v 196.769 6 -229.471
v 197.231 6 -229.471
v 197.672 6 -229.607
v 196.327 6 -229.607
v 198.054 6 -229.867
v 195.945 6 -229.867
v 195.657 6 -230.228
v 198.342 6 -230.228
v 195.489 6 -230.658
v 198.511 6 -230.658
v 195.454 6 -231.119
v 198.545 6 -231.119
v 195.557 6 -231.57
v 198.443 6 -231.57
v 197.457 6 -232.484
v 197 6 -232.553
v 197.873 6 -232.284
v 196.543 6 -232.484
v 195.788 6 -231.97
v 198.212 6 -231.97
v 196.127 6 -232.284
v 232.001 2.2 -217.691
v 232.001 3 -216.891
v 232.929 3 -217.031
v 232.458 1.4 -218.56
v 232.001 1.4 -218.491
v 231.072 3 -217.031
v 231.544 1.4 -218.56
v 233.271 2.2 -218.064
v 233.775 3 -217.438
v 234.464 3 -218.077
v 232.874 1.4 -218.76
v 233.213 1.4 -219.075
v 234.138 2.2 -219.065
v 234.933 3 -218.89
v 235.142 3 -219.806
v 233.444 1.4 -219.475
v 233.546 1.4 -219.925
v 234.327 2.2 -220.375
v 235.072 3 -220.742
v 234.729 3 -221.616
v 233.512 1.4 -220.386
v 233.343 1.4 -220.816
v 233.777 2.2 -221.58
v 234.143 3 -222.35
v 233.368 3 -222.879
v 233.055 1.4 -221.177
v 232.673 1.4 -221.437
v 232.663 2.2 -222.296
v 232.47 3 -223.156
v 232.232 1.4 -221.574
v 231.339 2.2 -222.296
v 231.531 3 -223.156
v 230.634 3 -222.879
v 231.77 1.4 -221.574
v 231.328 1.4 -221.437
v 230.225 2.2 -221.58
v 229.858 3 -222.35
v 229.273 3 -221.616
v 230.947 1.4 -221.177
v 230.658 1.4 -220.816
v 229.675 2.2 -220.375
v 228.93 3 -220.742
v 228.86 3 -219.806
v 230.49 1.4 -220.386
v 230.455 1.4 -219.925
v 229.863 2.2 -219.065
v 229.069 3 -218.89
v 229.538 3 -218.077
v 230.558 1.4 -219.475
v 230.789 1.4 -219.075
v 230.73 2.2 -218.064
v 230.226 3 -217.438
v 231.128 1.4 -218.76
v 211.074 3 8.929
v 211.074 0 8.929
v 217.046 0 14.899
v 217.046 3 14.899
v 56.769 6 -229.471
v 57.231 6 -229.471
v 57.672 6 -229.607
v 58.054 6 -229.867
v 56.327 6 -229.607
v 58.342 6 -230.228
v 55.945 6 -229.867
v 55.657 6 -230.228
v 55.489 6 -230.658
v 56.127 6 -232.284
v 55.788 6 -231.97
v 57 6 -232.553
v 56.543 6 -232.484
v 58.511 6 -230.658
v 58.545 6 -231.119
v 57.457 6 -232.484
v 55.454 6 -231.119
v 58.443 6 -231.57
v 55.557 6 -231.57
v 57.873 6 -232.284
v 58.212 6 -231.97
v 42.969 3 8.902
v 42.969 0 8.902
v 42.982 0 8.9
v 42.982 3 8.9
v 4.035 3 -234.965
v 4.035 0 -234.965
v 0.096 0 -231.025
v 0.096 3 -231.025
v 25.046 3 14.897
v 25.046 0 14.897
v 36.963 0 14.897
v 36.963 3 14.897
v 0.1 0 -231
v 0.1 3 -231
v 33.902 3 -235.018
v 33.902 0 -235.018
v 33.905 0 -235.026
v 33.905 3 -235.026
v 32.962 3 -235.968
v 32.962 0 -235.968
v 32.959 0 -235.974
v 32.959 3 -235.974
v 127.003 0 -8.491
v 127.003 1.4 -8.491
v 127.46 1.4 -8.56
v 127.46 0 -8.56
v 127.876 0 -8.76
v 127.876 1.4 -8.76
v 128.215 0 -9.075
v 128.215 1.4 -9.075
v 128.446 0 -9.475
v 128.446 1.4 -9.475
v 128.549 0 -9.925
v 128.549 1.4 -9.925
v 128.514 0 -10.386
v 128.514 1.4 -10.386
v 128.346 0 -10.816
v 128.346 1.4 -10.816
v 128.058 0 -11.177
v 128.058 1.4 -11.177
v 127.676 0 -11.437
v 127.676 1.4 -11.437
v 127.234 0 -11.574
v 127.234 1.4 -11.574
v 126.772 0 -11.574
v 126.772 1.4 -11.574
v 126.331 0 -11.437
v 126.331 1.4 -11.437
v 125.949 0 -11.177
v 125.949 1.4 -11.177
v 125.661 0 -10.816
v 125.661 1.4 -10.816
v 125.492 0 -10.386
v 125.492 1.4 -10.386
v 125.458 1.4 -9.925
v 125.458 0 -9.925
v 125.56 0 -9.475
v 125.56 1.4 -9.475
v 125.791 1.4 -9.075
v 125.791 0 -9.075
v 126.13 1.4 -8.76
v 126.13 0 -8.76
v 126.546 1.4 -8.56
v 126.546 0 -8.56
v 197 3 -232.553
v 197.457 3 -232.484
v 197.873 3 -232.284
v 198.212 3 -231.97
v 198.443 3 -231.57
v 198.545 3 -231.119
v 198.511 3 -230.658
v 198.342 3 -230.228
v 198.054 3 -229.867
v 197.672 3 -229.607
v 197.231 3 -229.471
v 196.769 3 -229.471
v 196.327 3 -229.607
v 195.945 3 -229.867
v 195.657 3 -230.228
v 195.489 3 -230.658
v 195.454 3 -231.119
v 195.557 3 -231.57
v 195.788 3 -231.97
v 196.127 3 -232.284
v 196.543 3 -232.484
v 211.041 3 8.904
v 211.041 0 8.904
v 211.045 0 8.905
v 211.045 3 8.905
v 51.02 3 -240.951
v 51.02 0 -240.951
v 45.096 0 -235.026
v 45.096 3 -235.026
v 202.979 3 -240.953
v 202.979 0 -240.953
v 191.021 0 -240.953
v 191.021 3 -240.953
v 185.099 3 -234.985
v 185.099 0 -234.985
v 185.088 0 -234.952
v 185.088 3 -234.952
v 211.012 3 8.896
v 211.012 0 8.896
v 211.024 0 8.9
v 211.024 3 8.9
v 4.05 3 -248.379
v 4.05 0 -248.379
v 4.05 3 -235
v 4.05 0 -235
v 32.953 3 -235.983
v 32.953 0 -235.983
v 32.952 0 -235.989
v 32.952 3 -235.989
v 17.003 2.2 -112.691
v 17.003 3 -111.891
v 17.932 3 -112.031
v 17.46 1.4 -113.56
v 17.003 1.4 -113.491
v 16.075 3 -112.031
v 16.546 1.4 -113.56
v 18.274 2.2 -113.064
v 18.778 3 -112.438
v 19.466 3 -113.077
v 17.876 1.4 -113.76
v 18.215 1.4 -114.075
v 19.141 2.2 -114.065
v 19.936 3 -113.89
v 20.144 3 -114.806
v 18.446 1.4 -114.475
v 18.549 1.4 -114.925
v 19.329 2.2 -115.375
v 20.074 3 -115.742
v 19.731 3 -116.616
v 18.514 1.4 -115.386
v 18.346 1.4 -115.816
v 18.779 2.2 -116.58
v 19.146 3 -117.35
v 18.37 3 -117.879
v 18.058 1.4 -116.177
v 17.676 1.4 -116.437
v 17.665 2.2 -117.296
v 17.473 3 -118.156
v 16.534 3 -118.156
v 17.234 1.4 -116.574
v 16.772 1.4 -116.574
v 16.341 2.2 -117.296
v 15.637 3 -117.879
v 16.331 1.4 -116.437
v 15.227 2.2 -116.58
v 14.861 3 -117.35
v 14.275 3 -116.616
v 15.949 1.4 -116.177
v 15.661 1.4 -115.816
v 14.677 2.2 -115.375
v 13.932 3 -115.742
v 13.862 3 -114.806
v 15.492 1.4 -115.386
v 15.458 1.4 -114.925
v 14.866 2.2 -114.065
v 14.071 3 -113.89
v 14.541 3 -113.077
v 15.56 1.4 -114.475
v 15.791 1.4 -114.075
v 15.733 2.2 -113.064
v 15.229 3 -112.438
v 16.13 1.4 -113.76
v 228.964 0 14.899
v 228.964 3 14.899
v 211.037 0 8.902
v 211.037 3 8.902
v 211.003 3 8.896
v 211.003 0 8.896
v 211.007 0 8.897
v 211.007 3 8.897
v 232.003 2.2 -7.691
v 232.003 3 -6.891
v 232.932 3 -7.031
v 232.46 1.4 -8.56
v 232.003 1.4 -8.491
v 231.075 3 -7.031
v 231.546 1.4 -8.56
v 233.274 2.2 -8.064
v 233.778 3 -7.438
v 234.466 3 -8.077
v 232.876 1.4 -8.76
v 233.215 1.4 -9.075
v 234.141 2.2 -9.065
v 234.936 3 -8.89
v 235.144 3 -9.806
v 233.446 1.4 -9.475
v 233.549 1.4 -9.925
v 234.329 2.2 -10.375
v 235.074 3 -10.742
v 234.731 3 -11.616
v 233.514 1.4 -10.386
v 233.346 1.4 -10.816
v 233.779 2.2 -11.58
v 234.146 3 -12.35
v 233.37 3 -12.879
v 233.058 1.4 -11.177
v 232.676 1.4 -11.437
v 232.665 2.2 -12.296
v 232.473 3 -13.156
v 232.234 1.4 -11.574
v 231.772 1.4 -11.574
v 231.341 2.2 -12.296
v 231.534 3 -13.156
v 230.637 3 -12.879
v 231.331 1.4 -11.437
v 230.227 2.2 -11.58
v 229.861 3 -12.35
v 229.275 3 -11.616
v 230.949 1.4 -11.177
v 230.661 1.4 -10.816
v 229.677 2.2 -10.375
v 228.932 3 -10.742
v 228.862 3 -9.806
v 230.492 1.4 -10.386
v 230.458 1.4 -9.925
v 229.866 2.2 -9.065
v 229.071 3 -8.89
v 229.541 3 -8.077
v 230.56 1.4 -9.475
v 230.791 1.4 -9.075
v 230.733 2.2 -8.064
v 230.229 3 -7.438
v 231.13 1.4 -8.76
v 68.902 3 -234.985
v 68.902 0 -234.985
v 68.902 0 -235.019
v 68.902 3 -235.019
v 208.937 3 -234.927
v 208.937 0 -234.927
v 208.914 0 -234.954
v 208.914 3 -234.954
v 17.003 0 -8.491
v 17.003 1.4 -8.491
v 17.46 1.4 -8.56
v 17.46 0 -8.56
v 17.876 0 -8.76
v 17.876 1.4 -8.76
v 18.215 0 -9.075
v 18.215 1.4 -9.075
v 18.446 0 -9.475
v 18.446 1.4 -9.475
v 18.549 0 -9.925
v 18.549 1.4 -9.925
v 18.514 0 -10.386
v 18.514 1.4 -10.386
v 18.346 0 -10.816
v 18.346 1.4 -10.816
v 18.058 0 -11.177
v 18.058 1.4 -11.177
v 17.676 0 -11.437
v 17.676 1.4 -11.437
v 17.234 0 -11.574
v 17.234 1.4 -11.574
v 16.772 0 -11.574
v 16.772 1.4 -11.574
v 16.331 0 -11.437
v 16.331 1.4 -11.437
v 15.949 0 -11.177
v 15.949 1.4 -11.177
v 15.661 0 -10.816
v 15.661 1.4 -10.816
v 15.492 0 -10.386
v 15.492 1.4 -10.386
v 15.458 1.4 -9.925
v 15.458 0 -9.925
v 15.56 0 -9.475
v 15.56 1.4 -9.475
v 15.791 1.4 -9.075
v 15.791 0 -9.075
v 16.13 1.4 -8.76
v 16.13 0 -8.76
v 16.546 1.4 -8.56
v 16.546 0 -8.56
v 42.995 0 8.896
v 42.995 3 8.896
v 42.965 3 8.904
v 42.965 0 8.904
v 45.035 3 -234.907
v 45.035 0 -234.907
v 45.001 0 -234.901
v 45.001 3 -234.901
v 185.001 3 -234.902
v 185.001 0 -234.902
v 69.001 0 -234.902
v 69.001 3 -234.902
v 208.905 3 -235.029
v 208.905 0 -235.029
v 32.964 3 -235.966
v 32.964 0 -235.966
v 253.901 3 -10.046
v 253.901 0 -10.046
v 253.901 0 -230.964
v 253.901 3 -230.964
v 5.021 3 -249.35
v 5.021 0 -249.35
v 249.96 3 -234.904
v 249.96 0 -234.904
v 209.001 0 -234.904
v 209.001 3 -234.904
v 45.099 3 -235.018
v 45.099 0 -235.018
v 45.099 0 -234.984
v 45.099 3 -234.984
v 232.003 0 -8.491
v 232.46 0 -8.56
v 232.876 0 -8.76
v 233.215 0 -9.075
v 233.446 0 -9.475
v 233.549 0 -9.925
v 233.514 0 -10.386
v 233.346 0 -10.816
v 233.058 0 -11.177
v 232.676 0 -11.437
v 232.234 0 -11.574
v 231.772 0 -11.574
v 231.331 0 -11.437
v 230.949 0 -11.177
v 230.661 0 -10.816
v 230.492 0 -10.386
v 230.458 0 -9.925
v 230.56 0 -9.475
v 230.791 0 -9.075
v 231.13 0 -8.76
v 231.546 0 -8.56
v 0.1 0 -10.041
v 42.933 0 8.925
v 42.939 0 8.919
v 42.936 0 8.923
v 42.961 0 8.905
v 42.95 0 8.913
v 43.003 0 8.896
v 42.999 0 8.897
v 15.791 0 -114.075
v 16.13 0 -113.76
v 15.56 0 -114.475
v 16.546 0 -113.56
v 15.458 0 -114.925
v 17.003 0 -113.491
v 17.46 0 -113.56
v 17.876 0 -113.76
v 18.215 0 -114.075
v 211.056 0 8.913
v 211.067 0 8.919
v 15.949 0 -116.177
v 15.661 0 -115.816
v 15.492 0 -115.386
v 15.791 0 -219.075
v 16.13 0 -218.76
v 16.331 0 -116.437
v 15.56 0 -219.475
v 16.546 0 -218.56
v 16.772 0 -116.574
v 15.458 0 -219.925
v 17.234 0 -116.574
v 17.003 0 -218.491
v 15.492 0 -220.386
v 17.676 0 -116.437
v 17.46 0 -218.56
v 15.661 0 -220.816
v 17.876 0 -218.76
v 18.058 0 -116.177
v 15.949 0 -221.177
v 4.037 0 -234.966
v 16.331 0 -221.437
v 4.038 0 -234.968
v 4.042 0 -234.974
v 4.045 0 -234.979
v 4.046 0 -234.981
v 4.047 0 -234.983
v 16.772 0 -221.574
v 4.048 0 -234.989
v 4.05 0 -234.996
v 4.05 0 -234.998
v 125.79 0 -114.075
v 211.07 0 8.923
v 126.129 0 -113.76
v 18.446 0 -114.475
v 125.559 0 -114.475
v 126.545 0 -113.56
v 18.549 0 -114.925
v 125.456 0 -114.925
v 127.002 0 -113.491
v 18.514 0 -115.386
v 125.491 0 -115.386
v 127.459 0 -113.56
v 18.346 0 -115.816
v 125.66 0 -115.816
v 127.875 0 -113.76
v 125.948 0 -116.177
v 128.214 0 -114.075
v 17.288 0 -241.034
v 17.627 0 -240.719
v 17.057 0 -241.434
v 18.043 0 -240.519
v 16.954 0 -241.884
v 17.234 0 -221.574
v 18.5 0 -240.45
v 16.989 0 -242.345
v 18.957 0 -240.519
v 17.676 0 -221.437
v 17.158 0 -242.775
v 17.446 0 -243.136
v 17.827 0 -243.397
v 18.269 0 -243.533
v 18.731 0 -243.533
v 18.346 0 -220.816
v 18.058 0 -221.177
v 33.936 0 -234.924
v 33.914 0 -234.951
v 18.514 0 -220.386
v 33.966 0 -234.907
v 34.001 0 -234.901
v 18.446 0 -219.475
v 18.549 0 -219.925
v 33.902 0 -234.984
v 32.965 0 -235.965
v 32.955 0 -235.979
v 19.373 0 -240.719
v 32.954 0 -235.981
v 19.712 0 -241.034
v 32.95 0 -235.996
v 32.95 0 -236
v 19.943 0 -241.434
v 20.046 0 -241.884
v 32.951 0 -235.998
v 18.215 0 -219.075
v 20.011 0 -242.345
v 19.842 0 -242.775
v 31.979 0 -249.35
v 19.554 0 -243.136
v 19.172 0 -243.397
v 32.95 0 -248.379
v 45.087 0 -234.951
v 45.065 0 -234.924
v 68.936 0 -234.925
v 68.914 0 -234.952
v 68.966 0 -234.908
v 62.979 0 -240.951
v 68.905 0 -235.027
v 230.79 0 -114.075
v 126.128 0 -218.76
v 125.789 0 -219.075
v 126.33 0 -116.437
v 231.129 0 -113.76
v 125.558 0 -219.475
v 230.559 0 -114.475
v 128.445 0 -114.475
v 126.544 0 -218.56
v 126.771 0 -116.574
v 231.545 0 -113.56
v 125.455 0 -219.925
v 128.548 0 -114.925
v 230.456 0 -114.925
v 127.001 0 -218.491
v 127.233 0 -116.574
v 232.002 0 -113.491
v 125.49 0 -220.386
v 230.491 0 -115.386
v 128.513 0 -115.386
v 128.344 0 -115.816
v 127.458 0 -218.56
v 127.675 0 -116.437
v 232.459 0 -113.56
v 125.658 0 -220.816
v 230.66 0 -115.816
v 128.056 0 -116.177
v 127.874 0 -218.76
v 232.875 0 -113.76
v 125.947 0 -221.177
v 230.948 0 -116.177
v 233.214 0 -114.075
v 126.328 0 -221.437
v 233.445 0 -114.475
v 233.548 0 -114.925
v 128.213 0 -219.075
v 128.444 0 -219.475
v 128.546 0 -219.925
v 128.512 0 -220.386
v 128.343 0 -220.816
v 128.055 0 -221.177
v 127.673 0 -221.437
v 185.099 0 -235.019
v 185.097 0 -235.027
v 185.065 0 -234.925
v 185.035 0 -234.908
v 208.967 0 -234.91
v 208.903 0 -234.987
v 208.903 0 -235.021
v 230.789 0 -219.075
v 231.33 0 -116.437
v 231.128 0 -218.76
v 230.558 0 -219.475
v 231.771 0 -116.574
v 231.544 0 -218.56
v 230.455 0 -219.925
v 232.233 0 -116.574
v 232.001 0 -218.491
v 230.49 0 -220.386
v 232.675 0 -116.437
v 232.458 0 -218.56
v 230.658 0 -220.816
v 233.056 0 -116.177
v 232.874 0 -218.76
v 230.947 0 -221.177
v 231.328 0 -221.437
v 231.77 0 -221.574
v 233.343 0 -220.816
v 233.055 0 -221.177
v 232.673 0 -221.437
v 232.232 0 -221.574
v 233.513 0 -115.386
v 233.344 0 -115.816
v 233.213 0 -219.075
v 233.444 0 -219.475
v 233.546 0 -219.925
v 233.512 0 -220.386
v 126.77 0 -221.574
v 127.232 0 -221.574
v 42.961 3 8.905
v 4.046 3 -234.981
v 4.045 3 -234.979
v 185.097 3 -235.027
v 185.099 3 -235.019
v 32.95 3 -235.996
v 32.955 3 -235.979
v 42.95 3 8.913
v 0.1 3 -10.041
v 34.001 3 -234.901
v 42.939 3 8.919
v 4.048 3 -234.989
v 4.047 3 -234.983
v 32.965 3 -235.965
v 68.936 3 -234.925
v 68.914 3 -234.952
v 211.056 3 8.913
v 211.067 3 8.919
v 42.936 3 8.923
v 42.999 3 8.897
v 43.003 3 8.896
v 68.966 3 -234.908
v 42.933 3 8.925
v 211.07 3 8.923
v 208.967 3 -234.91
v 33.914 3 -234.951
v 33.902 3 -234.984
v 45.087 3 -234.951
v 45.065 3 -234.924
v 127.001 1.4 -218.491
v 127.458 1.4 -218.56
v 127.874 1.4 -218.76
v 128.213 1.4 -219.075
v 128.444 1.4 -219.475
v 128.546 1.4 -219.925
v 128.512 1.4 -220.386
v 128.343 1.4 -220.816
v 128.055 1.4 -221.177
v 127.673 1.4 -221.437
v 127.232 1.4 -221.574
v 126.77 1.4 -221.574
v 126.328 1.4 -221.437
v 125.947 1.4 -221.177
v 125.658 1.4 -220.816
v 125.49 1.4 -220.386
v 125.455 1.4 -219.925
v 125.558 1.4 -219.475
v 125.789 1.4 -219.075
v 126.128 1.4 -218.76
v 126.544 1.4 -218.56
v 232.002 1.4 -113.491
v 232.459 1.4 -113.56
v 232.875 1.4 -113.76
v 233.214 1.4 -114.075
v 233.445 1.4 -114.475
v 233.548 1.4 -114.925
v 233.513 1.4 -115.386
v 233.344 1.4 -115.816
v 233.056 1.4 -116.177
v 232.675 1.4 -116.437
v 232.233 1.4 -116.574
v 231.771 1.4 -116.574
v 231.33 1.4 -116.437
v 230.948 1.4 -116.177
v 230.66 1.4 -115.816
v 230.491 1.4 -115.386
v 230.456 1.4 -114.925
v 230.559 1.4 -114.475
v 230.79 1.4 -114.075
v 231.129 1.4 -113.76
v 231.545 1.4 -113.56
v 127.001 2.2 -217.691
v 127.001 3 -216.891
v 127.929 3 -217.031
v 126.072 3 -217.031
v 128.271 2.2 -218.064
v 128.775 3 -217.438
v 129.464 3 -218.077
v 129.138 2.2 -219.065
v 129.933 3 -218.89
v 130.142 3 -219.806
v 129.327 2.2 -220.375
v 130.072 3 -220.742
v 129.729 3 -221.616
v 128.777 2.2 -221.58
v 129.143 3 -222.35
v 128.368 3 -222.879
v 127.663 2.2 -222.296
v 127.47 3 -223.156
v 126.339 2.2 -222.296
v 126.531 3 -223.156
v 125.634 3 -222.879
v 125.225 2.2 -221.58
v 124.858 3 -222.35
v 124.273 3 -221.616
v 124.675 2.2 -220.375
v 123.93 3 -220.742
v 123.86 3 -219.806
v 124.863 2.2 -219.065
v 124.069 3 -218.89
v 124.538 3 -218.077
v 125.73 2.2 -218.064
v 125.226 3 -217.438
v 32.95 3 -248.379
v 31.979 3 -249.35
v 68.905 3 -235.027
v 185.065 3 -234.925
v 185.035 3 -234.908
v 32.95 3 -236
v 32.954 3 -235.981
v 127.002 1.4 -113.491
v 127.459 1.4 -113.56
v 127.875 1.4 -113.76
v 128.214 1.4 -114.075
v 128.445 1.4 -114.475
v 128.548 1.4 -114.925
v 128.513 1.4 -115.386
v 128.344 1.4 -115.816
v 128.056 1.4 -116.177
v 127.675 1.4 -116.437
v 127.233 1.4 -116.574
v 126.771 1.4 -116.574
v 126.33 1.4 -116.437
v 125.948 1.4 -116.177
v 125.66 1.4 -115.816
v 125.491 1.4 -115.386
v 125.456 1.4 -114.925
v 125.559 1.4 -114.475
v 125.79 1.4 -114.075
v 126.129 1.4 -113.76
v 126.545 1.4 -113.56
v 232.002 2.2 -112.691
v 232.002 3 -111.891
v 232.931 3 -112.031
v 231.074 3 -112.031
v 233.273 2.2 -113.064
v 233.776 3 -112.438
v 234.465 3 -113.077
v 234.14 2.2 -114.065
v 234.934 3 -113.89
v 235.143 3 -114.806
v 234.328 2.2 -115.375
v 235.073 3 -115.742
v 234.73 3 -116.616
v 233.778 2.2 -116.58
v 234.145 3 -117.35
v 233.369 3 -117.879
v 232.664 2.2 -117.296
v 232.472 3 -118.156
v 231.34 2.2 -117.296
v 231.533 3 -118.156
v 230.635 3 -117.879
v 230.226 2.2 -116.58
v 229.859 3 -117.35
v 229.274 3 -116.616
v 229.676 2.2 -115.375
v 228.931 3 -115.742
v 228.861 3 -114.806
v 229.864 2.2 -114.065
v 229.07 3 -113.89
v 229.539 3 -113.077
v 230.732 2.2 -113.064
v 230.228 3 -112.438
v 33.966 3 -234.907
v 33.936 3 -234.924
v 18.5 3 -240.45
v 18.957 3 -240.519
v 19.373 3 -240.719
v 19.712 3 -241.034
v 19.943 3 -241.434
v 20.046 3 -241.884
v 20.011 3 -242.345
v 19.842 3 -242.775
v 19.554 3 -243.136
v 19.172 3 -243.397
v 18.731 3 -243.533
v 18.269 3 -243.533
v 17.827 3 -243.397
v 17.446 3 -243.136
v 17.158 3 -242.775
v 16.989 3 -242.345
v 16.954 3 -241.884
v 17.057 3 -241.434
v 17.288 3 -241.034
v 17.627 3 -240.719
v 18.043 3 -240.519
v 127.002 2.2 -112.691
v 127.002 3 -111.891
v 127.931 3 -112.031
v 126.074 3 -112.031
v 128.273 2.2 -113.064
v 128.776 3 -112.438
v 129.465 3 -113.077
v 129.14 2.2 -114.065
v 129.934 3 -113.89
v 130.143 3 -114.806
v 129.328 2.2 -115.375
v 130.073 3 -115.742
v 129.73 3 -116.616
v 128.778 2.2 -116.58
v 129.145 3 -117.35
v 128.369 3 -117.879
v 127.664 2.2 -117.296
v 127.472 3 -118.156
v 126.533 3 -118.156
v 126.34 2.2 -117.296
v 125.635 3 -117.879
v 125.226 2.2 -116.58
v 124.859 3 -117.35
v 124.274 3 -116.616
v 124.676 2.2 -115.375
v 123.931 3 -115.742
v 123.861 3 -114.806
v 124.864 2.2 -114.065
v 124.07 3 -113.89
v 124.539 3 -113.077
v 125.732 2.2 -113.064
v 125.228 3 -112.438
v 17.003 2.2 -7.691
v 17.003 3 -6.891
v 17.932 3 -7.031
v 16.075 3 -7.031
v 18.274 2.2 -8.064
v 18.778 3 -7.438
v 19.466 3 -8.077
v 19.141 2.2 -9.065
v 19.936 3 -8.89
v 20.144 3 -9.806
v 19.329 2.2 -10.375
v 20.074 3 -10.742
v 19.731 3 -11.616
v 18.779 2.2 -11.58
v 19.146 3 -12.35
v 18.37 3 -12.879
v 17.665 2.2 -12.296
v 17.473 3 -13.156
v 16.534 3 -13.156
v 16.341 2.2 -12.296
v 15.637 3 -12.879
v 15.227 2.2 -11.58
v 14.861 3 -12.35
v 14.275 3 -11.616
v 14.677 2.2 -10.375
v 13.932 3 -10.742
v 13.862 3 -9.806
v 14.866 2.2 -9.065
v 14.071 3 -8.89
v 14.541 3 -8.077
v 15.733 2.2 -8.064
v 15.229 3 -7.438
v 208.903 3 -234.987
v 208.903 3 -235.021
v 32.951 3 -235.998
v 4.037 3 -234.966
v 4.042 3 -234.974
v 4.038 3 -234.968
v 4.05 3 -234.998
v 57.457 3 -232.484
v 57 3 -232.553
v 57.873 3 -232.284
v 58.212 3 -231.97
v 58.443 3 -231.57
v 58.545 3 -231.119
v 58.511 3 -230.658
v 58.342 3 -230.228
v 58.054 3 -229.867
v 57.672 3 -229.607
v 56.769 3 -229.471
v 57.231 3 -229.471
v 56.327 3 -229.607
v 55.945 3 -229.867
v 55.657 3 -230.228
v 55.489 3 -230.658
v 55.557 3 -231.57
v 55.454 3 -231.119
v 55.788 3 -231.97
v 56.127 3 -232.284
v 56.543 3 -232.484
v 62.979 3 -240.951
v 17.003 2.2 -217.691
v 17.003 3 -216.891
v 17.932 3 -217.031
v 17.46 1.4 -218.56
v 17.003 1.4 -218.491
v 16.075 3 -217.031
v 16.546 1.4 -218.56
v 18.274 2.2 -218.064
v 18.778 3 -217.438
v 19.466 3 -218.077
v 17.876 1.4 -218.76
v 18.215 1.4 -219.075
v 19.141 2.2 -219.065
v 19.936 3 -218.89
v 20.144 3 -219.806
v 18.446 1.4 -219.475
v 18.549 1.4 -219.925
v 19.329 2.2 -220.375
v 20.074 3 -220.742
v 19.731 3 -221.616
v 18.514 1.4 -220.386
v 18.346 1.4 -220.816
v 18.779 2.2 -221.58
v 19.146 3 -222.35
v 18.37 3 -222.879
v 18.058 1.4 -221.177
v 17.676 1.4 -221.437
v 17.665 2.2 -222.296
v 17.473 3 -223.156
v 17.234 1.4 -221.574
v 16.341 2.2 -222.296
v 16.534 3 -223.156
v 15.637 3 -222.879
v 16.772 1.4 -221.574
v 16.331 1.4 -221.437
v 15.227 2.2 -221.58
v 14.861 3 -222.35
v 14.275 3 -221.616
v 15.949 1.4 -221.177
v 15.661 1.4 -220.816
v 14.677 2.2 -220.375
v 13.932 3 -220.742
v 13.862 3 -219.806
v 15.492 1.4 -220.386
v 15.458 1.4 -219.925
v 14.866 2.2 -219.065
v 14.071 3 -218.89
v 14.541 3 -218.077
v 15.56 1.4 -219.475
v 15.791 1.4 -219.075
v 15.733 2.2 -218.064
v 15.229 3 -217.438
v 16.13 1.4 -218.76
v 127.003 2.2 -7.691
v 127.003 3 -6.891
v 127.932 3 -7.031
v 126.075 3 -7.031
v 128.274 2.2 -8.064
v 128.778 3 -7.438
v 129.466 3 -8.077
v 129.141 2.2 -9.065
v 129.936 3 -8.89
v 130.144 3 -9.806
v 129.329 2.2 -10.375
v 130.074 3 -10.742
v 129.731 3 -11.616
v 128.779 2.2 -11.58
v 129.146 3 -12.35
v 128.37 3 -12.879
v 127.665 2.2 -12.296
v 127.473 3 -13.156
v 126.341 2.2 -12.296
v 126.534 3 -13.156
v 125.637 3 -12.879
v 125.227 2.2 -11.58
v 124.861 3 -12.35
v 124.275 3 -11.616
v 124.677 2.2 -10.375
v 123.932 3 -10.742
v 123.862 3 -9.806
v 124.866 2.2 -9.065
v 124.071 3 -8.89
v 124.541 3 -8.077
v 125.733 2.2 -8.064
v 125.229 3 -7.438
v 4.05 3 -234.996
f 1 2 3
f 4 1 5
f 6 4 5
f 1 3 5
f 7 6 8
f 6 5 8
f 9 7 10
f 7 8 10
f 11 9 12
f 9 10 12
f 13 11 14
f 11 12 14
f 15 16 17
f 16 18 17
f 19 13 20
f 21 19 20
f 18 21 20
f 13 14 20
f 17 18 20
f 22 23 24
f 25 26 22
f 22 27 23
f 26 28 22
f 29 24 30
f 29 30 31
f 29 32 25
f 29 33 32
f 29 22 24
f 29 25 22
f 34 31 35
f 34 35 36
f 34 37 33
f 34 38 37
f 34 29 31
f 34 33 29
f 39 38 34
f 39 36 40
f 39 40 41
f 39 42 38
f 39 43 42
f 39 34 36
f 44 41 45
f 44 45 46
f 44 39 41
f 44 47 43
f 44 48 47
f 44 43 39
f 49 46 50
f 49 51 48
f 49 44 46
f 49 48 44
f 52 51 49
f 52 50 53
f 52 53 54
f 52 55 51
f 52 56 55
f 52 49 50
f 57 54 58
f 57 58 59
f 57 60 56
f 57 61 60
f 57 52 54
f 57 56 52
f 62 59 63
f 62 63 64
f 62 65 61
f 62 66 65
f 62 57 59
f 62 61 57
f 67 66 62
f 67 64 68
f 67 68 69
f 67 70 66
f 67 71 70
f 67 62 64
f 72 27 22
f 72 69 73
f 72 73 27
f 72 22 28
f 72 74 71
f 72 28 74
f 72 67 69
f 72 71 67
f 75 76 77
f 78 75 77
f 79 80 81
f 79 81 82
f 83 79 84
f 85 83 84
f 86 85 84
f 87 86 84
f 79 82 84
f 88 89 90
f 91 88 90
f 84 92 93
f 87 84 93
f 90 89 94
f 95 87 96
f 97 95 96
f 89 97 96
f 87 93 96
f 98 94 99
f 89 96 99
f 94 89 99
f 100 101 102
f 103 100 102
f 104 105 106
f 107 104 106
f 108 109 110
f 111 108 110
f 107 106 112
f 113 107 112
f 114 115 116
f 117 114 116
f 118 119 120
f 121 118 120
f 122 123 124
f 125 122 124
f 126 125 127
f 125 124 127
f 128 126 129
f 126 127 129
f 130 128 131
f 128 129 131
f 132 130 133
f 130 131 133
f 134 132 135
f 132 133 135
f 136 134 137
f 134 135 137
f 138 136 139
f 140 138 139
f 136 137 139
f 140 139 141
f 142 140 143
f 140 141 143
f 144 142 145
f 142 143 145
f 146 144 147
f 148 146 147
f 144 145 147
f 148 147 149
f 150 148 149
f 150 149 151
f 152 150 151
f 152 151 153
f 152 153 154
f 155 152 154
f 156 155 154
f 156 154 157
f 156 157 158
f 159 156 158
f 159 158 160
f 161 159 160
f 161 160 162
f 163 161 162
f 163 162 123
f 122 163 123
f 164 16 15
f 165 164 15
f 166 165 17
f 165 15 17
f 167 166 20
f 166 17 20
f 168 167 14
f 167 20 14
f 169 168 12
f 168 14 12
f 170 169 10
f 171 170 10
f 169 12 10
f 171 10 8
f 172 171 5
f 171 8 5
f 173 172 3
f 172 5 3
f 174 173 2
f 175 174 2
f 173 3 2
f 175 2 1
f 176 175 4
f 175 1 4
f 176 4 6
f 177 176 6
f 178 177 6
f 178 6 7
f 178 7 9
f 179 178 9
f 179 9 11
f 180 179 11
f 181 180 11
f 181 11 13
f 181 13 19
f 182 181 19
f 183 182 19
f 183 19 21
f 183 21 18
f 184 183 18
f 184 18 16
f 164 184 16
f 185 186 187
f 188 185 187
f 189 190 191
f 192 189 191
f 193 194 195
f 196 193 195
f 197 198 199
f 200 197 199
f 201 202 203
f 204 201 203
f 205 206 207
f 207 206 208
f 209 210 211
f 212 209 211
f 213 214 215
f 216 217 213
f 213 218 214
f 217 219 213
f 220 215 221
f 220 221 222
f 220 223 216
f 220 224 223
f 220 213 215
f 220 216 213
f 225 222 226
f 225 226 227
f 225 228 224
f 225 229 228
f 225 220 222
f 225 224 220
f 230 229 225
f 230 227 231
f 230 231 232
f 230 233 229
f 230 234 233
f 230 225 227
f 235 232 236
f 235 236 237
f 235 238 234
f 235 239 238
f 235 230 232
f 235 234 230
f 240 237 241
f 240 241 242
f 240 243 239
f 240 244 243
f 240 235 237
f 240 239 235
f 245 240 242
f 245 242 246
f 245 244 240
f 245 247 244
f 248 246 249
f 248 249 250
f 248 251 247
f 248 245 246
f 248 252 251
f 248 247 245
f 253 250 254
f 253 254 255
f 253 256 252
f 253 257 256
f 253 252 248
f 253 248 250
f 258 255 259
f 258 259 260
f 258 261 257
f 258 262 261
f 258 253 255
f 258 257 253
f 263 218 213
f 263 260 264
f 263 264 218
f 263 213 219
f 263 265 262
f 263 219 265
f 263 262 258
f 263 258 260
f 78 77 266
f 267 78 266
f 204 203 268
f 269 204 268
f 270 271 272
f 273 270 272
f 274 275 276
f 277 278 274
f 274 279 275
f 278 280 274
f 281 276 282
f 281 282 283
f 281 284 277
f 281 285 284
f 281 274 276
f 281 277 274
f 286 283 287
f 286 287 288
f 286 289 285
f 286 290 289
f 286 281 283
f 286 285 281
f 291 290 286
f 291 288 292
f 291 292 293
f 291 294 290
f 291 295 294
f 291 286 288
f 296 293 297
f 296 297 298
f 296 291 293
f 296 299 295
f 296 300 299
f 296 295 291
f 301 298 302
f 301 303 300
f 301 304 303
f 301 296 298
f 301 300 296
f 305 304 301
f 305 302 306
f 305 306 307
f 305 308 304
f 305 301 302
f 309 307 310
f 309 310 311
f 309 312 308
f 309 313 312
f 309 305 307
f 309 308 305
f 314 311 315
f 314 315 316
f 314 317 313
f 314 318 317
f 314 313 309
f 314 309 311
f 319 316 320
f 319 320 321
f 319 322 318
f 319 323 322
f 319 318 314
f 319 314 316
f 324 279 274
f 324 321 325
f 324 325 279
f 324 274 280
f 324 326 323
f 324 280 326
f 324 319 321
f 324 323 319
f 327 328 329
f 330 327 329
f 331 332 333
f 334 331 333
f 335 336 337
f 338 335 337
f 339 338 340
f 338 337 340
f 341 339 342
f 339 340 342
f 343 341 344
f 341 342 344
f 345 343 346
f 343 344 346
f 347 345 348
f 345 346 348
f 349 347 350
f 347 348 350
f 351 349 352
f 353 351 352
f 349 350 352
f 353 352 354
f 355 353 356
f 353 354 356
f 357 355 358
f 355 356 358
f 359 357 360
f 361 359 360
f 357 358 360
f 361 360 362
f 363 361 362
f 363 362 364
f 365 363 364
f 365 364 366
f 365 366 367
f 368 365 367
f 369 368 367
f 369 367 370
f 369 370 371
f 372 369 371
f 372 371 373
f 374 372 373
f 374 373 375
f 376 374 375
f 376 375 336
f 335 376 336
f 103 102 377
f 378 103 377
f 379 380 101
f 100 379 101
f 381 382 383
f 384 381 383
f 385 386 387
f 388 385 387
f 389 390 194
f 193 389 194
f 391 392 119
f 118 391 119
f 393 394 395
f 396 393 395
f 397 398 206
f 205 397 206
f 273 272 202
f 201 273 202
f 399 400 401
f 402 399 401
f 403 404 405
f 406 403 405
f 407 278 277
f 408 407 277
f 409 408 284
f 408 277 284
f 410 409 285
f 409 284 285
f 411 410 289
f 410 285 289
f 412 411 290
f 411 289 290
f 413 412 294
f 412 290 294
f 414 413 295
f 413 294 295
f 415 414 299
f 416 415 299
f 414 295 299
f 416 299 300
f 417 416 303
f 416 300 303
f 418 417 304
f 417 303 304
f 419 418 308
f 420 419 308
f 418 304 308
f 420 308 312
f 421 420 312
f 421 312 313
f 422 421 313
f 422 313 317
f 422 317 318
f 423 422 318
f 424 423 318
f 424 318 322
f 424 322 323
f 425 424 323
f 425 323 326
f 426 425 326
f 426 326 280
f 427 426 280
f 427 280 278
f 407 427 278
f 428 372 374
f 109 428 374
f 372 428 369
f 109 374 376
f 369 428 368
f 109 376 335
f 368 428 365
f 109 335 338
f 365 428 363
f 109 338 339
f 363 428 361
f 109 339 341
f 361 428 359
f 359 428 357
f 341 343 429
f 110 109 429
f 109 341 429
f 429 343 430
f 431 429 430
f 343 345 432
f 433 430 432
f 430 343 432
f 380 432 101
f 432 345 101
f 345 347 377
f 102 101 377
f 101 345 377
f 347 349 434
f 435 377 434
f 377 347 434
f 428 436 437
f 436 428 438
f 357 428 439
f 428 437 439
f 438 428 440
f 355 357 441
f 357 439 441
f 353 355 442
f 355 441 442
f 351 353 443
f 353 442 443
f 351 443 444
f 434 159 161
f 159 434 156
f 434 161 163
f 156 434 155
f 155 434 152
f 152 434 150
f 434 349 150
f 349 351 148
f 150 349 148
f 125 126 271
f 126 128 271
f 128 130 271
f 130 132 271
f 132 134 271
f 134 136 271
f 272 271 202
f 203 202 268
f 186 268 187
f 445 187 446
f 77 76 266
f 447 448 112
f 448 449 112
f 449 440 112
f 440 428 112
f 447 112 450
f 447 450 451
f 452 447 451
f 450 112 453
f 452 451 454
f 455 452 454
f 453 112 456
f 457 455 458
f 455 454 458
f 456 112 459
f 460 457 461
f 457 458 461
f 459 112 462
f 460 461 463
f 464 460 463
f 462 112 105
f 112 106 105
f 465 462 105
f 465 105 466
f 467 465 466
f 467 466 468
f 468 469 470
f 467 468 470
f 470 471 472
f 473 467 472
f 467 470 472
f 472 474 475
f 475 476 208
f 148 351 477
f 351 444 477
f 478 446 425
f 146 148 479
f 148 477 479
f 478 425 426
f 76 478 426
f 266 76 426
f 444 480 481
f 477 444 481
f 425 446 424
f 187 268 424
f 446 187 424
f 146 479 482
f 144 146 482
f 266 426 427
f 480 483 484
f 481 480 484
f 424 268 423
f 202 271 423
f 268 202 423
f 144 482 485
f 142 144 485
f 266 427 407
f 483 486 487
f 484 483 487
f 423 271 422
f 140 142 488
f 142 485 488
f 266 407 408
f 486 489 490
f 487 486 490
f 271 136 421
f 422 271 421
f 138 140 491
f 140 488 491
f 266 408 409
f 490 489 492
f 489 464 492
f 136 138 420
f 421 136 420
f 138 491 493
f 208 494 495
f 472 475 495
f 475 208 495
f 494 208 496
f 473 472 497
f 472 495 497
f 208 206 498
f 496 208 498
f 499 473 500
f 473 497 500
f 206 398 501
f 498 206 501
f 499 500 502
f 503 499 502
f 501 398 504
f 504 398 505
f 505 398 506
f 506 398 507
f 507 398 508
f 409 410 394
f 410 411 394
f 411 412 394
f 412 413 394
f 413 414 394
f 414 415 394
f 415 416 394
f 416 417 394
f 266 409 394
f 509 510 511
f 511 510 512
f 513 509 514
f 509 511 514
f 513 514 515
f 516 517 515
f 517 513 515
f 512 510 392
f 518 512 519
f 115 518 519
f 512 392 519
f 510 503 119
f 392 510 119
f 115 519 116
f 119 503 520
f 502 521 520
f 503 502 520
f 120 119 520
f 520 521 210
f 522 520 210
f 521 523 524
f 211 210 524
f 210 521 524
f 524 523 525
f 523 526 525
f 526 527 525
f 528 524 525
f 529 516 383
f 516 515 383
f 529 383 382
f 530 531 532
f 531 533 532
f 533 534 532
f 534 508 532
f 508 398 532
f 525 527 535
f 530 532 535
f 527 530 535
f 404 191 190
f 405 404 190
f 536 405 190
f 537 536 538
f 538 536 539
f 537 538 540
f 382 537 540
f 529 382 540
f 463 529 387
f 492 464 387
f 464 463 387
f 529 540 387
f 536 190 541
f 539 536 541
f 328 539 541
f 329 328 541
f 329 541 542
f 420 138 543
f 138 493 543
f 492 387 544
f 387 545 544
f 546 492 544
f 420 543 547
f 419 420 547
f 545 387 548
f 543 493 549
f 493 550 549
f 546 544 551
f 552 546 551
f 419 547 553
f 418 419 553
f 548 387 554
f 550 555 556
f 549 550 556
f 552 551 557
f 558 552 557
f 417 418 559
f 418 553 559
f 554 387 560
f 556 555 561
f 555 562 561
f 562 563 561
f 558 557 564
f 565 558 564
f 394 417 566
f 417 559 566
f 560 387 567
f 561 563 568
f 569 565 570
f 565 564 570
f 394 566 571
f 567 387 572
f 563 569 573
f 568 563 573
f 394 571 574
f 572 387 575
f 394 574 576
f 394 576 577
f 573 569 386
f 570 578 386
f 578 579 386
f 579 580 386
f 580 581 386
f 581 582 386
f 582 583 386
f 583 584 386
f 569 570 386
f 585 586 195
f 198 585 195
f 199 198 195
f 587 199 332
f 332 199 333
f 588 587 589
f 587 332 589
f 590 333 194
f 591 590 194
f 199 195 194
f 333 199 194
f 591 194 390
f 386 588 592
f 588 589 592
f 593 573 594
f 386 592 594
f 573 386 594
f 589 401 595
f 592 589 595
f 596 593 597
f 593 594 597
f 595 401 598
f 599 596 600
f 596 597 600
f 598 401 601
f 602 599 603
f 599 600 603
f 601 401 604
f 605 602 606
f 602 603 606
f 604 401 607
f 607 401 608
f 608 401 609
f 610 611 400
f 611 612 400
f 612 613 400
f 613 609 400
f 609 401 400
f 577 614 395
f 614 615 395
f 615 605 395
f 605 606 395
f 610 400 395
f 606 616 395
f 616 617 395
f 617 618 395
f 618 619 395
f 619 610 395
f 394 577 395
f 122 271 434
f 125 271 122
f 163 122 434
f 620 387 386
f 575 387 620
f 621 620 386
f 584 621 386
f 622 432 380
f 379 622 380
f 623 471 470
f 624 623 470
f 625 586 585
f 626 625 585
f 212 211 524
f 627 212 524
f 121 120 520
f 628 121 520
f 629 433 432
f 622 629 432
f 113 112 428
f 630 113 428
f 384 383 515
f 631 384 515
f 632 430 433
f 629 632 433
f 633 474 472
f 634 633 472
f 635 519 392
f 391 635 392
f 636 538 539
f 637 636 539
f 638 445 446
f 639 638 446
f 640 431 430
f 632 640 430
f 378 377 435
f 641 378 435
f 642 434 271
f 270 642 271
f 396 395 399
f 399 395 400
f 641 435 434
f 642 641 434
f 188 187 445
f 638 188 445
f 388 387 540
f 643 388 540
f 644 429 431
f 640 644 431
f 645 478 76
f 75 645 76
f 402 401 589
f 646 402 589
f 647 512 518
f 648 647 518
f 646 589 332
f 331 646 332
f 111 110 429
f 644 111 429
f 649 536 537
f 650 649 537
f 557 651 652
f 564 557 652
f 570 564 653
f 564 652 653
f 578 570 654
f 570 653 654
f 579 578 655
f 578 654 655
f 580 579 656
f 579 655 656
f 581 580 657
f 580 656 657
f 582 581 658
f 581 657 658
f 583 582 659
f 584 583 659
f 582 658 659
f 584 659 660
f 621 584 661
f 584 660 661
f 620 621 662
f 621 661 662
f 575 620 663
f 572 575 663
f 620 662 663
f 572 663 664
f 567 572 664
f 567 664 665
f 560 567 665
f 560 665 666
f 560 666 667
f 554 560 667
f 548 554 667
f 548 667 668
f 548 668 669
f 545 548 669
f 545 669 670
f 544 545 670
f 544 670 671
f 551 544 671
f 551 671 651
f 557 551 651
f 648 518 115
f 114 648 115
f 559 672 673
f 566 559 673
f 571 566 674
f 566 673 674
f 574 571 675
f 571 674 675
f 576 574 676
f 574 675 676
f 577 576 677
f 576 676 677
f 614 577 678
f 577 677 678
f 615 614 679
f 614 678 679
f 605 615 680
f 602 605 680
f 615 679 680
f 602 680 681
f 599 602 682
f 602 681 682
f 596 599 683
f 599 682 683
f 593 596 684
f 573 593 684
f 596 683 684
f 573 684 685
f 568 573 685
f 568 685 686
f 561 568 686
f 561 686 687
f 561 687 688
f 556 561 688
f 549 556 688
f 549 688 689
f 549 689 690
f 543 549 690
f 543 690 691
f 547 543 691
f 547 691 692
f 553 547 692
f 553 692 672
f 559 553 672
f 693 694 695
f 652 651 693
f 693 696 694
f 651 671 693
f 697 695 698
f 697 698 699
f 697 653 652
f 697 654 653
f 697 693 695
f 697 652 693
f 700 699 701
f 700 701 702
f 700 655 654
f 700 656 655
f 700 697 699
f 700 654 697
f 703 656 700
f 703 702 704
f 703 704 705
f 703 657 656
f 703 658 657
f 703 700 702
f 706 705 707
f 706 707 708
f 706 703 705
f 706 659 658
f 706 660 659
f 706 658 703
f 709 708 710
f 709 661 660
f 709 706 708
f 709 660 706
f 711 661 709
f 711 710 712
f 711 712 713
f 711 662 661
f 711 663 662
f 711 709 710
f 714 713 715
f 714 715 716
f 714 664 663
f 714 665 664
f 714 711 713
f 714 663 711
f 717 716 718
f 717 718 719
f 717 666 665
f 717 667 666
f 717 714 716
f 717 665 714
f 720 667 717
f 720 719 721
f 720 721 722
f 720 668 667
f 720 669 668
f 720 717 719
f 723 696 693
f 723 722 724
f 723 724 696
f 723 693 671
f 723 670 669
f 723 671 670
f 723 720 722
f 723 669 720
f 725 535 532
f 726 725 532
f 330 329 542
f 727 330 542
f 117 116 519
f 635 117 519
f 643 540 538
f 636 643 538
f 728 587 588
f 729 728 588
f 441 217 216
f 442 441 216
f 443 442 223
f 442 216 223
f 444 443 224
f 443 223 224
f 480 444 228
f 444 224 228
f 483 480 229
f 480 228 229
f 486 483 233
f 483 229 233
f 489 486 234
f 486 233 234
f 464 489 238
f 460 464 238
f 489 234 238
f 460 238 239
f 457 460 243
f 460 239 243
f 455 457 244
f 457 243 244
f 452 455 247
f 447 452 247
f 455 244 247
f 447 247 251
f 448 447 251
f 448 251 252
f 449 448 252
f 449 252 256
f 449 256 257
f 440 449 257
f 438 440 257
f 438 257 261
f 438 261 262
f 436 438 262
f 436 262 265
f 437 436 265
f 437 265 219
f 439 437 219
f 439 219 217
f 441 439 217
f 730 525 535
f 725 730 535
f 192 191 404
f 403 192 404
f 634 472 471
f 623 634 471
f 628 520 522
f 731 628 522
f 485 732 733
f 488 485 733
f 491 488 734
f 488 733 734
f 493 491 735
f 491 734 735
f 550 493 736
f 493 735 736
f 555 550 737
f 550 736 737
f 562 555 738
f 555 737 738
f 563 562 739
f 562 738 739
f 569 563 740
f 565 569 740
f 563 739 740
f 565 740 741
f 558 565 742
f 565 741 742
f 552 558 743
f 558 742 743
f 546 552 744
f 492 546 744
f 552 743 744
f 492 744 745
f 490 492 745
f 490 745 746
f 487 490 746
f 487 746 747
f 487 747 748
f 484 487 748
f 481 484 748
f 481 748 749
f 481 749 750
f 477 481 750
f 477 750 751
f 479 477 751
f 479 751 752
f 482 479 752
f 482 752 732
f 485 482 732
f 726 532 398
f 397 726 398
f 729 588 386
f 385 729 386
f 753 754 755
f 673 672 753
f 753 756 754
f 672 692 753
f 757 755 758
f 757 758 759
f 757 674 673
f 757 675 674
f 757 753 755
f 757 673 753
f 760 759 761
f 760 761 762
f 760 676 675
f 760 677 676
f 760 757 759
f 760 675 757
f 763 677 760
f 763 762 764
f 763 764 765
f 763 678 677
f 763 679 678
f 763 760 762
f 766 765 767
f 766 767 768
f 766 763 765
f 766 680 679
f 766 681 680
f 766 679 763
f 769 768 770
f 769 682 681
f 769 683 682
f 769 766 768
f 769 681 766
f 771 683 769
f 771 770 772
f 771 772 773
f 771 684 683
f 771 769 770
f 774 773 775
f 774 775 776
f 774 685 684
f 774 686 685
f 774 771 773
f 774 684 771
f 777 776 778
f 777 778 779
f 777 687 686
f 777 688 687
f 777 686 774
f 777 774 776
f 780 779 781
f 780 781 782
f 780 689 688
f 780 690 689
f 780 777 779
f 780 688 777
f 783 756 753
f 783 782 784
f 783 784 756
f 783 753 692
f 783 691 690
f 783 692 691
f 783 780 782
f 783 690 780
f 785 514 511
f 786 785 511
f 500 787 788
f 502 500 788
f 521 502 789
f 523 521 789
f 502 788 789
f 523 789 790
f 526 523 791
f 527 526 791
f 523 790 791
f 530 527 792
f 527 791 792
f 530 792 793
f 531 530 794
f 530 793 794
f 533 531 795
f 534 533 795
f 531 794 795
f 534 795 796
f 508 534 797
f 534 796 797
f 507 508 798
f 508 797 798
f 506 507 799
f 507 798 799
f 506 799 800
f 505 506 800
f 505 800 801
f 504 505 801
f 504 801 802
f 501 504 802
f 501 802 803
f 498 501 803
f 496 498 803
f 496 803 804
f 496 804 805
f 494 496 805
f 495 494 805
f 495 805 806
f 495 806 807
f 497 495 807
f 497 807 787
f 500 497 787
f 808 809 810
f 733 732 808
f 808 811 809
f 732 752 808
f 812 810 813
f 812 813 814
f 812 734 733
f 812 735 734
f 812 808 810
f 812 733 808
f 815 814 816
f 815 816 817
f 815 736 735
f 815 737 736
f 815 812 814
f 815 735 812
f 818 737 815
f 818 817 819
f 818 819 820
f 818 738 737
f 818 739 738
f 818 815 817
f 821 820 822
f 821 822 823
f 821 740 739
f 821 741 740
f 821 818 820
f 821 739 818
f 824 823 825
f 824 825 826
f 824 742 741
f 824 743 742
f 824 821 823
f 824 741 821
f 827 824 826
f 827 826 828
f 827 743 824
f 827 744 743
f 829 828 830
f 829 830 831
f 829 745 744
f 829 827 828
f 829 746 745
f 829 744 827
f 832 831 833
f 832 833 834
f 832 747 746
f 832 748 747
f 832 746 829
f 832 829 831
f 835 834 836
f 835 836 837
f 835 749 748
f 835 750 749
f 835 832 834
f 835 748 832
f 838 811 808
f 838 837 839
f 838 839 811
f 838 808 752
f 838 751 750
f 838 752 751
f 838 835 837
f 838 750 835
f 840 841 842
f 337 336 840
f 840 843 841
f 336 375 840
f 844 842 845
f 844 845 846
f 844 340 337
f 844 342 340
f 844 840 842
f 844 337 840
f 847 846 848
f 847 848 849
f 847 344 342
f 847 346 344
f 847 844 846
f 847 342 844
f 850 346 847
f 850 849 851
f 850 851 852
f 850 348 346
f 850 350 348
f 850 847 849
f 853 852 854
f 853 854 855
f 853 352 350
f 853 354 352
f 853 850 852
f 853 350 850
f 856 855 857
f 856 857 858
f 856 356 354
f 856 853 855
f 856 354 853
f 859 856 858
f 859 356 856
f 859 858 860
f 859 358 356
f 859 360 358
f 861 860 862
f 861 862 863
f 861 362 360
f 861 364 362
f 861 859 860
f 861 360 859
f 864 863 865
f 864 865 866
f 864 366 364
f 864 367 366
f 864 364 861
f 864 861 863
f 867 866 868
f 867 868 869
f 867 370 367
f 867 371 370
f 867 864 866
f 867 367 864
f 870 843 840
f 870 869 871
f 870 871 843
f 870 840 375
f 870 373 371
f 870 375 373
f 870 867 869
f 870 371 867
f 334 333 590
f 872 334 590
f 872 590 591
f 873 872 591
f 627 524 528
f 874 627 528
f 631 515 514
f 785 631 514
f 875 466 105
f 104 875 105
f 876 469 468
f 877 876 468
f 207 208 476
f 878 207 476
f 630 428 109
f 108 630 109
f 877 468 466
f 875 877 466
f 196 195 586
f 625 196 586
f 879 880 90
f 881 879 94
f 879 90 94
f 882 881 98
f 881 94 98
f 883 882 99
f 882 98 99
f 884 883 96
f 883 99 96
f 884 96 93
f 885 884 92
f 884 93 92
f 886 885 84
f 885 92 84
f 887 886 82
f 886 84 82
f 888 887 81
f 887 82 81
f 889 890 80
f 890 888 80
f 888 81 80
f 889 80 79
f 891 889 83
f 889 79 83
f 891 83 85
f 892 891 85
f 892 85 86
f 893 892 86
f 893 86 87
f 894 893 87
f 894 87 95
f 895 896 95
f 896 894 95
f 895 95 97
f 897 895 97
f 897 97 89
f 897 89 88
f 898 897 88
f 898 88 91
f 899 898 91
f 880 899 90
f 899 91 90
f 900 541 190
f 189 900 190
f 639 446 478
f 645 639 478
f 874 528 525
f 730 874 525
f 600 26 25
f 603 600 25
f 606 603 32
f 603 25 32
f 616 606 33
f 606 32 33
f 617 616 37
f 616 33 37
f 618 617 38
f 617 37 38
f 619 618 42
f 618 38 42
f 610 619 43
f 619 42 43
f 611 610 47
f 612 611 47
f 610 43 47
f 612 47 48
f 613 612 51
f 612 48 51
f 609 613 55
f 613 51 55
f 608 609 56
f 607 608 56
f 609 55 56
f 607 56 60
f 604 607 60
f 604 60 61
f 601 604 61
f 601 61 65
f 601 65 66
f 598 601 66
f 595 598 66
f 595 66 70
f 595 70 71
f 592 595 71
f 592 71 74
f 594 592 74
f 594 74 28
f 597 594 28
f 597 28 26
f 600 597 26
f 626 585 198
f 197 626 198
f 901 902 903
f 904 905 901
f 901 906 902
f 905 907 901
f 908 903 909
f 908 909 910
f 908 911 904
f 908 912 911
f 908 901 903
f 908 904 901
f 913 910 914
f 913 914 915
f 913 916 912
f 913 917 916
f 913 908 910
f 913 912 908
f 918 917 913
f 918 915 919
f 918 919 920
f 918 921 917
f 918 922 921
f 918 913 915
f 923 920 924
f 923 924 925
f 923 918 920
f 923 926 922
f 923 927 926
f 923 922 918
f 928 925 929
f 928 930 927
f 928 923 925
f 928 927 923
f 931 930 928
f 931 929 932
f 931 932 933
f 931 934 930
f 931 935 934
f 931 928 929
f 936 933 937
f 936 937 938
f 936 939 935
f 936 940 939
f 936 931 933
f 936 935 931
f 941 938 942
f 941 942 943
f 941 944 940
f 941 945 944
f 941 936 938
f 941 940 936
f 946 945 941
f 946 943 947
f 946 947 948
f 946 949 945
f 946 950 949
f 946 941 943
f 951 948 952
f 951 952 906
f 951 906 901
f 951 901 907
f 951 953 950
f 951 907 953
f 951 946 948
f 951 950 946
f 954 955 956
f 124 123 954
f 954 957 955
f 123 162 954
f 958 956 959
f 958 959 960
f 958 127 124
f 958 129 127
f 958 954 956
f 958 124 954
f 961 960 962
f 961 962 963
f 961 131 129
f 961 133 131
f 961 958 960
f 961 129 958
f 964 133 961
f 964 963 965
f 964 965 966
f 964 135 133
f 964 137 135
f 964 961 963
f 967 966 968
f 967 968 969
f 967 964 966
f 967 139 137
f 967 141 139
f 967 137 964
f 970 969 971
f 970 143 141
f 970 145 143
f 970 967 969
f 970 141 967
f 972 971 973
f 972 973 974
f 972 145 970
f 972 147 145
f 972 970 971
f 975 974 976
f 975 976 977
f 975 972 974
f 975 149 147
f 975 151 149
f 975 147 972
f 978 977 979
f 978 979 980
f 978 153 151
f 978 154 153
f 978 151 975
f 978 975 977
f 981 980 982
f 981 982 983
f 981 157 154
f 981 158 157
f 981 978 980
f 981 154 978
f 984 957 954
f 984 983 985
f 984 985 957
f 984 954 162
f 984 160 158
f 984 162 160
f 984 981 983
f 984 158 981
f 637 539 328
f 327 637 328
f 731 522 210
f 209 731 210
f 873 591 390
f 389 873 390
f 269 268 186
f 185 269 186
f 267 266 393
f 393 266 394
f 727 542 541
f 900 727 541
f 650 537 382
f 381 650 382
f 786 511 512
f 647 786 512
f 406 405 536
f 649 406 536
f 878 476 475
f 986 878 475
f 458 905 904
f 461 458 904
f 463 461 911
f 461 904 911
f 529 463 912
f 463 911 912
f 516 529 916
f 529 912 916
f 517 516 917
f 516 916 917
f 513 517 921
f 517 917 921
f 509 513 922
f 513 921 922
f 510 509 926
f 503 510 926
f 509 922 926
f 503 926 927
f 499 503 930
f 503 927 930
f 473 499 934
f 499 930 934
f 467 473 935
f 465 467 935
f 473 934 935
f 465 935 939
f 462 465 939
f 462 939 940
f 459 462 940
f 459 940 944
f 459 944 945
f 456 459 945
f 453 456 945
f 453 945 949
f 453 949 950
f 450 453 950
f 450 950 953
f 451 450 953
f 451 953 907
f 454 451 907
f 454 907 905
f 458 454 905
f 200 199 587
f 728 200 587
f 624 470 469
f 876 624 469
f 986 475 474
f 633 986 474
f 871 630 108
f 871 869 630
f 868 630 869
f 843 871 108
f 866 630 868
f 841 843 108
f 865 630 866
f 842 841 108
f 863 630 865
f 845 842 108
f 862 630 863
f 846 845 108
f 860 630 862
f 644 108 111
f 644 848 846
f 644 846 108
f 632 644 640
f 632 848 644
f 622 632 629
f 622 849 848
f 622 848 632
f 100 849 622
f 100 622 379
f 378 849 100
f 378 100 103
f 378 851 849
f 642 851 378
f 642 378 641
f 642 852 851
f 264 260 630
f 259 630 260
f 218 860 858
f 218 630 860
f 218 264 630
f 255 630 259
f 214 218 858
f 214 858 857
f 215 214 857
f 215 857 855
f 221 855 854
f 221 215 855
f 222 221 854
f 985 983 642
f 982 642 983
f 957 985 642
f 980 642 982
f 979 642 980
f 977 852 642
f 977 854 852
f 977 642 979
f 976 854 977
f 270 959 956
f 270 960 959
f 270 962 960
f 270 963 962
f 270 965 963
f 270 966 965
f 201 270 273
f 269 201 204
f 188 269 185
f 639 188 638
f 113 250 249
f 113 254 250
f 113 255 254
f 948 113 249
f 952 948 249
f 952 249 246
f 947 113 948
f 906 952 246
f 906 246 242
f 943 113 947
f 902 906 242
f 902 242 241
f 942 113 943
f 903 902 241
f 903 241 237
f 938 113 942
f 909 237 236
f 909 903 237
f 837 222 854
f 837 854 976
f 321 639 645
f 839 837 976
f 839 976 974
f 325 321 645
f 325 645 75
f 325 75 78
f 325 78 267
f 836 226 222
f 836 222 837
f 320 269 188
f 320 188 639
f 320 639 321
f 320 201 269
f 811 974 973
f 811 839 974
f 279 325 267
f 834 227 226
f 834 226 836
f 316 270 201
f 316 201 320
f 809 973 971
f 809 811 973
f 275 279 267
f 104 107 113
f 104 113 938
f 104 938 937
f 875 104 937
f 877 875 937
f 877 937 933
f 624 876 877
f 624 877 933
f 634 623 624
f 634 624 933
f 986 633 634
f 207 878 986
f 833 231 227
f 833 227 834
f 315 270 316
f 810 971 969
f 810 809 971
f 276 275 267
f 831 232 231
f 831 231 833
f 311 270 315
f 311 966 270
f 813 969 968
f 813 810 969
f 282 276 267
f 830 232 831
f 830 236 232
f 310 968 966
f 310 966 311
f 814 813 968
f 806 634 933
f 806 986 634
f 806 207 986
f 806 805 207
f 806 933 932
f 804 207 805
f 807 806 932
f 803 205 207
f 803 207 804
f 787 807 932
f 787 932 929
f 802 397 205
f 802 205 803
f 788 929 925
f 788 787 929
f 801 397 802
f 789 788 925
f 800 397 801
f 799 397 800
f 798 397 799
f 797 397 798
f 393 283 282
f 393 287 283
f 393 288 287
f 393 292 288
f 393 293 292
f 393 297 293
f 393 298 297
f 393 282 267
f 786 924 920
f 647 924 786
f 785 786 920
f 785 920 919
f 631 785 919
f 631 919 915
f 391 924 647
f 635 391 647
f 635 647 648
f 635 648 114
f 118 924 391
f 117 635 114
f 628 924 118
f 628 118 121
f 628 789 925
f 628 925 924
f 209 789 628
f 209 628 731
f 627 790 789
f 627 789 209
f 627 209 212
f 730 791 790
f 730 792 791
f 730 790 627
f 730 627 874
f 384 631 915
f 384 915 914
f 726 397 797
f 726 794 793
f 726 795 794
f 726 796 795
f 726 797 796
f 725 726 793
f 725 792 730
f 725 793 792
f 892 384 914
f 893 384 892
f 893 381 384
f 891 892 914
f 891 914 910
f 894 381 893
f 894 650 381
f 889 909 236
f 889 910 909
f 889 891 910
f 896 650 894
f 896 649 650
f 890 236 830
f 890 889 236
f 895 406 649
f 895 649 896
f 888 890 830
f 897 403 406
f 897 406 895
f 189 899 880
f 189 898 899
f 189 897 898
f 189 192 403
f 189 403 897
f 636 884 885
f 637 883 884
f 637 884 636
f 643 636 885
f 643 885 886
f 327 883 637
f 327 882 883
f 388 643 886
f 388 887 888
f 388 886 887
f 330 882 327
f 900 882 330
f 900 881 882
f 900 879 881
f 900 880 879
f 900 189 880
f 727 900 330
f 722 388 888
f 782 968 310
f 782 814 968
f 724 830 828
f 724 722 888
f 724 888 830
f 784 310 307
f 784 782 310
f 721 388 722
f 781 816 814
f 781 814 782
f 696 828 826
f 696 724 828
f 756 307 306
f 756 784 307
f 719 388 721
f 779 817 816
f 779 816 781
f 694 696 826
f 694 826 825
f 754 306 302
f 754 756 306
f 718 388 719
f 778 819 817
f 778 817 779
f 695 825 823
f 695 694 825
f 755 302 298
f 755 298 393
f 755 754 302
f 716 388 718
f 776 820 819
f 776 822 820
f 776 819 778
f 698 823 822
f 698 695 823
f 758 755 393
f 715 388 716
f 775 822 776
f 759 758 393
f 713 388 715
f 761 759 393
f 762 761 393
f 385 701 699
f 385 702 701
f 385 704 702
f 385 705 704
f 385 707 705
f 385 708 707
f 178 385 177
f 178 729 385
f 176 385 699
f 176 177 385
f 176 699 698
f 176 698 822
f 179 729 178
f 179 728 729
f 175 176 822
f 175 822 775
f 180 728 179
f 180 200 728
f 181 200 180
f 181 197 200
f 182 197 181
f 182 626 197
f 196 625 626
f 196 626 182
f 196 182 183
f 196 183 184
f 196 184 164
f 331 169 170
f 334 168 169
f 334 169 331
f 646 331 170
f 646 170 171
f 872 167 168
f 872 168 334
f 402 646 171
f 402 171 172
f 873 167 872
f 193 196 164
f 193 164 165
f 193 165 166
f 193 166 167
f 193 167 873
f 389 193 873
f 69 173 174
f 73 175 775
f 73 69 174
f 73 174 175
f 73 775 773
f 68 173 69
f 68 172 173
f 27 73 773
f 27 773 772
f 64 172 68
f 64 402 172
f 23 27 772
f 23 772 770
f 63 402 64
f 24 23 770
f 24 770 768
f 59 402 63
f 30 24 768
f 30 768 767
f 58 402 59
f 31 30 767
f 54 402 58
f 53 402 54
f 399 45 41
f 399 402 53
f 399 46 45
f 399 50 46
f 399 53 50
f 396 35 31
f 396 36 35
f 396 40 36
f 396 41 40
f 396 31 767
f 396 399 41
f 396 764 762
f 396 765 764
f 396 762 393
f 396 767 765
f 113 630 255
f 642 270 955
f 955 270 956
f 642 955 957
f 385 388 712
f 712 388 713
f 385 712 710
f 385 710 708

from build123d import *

# Parameters (mm, degrees)
BOSS_EXTRUDE1_DEPTH = 3
SKETCH2_R           = 1.55
CUT_EXTRUDE1_DEPTH  = 356.879522089
BOSS_EXTRUDE3_START = -6
SKETCH3_R           = 1.55
BOSS_EXTRUDE3_DEPTH = 6
CHAMFER1_SIZE       = 1.6


with BuildPart() as part:
    # Sketch1 → Boss-Extrude1 (new body)
    with BuildSketch(Plane(origin=(0, 0, 0), x_dir=(1, 0, 0), z_dir=(0, 1, 0))):
        Polygon((5.02071, 249.35), (4.05, 248.379), (4.05, 235), (4.04962, 234.998), (4.04981, 234.996), (4.04812, 234.989), (4.04698, 234.983), (4.04588, 234.981), (4.04531, 234.979), (4.04157, 234.974), (4.0383, 234.968), (4.03662, 234.966), (4.03536, 234.965), (0.096072974, 231.02453611), (0.100466918, 230.999536627), (0.100466918, 10.040936627), (25.04559171, -14.896738024), (36.96279171, -14.896738024), (42.932604901, -8.925141349), (42.936204527, -8.922620814), (42.939004026, -8.919250398), (42.950303055, -8.91270872), (42.961001942, -8.905217131), (42.965301773, -8.904076493), (42.969093555, -8.901881205), (42.981993376, -8.899610189), (42.99459311, -8.896229197), (42.99899314, -8.896608851), (43.00329308, -8.895848512), (211.00329308, -8.895848512), (211.00729308, -8.896608512), (211.01229308, -8.896228512), (211.02429308, -8.899608512), (211.03729308, -8.901878512), (211.04129308, -8.904078512), (211.04529308, -8.905218512), (211.05629308, -8.912718512), (211.06729308, -8.919248512), (211.07029308, -8.922608512), (211.07446368, -8.9293432), (217.045710314, -14.898806454), (228.963710314, -14.898806454), (253.901184996, 10.046118309), (253.901184996, 230.963718309), (249.95959644, 234.904129665), (209.00059644, 234.904129665), (208.966596216, 234.910128396), (208.936595582, 234.927127275), (208.913594574, 234.954126417), (208.902593341, 234.987126006), (208.902593341, 235.021126006), (208.904592744, 235.029126155), (202.978707894, 240.953241173), (191.020707894, 240.953241173), (185.096592876, 235.027356323), (185.098592876, 235.019356323), (185.098592876, 234.985356323), (185.087592876, 234.952356323), (185.064592876, 234.925356323), (185.034592876, 234.908356323), (185.000592876, 234.902356323), (69.000592876, 234.902356323), (68.966392876, 234.908356323), (68.936292876, 234.925356323), (68.913992876, 234.952356323), (68.902092876, 234.985356323), (68.902092876, 235.019356323), (68.904890404, 235.027357188), (62.979005555, 240.951472206), (51.020405555, 240.951472206), (45.096290537, 235.025587356), (45.099090537, 235.017587356), (45.099090537, 234.983587356), (45.087190537, 234.950587356), (45.064890537, 234.923587356), (45.034790537, 234.906587356), (45.000590537, 234.900587356), (34.000590537, 234.900587356), (33.966390537, 234.906587356), (33.936290537, 234.923587356), (33.913990537, 234.950587356), (33.902090537, 234.983587356), (33.902090537, 235.017587356), (33.904888065, 235.025588221), (32.964897694, 235.965297853), (32.963697694, 235.966297853), (32.961997694, 235.968297853), (32.958697694, 235.974297853), (32.954997694, 235.979297853), (32.954400114, 235.981289787), (32.953300114, 235.983289787), (32.95219879, 235.989297006), (32.950499346, 235.996294719), (32.950699249, 235.998293754), (32.9503, 236.00029), (32.9503, 248.37929), (31.9793, 249.35), align=None)
    extrude(amount=BOSS_EXTRUDE1_DEPTH)

    # Sketch2 → Cut-Extrude1 (cut, through all)
    with BuildSketch(Plane(origin=(0, 3, 0), x_dir=(1, 0, 0), z_dir=(0, 1, 0))):
        with Locations(Location((17.00329308, 10.040936627, 0), (0, 0, 270))):
            Circle(SKETCH2_R)
        with Locations(Location((127.00329308, 10.040936627, 0), (0, 0, 270))):
            Circle(SKETCH2_R)
        with Locations(Location((232.003293088, 10.040936627, 0), (0, 0, 270))):
            Circle(SKETCH2_R)
        with Locations(Location((232.002032216, 115.040936627, 0), (0, 0, 270))):
            Circle(SKETCH2_R)
        with Locations(Location((232.000771344, 220.040936627, 0), (0, 0, 270))):
            Circle(SKETCH2_R)
        with Locations(Location((127.002032208, 115.040936627, 0), (0, 0, 270))):
            Circle(SKETCH2_R)
        with Locations(Location((17.00329308, 115.040936627, 0), (0, 0, 270))):
            Circle(SKETCH2_R)
        with Locations(Location((17.00329308, 220.040936627, 0), (0, 0, 270))):
            Circle(SKETCH2_R)
        with Locations(Location((127.000771337, 220.040936627, 0), (0, 0, 270))):
            Circle(SKETCH2_R)
        with Locations(Location((196.999707894, 231.003241173, 0), (0, 0, 270))):
            Circle(SKETCH2_R)
        with Locations(Location((56.999705555, 231.003241173, 0), (0, 0, 270))):
            Circle(SKETCH2_R)
        with Locations(Location((18.499978099, 242, 0), (0, 0, 270))):
            Circle(SKETCH2_R)
    extrude(amount=-CUT_EXTRUDE1_DEPTH, mode=Mode.SUBTRACT)

    # Sketch3 → Boss-Extrude3 (add)
    with BuildSketch(Plane.XZ.offset(BOSS_EXTRUDE3_START)):
        with Locations(Location((56.999705555, -231.003241173, 0), (0, 0, 270))):
            Circle(SKETCH3_R)
        with Locations(Location((196.999707894, -231.003241173, 0), (0, 0, 270))):
            Circle(SKETCH3_R)
    extrude(amount=BOSS_EXTRUDE3_DEPTH)

    # Chamfer1
    chamfer1_edges = [part.edges().sort_by_distance(p)[0] for p in [
        (232.000771344, 3, -221.590936627),
        (232.002032216, 3, -116.590936627),
        (232.003293088, 3, -11.590936627),
        (127.002032208, 3, -116.590936627),
        (17.00329308, 3, -116.590936627),
        (127.000771337, 3, -221.590936627),
        (17.00329308, 3, -221.590936627),
        (127.00329308, 3, -11.590936627),
        (17.00329308, 3, -11.590936627),
    ]]
    chamfer(chamfer1_edges, length=CHAMFER1_SIZE)


solid = part.part
